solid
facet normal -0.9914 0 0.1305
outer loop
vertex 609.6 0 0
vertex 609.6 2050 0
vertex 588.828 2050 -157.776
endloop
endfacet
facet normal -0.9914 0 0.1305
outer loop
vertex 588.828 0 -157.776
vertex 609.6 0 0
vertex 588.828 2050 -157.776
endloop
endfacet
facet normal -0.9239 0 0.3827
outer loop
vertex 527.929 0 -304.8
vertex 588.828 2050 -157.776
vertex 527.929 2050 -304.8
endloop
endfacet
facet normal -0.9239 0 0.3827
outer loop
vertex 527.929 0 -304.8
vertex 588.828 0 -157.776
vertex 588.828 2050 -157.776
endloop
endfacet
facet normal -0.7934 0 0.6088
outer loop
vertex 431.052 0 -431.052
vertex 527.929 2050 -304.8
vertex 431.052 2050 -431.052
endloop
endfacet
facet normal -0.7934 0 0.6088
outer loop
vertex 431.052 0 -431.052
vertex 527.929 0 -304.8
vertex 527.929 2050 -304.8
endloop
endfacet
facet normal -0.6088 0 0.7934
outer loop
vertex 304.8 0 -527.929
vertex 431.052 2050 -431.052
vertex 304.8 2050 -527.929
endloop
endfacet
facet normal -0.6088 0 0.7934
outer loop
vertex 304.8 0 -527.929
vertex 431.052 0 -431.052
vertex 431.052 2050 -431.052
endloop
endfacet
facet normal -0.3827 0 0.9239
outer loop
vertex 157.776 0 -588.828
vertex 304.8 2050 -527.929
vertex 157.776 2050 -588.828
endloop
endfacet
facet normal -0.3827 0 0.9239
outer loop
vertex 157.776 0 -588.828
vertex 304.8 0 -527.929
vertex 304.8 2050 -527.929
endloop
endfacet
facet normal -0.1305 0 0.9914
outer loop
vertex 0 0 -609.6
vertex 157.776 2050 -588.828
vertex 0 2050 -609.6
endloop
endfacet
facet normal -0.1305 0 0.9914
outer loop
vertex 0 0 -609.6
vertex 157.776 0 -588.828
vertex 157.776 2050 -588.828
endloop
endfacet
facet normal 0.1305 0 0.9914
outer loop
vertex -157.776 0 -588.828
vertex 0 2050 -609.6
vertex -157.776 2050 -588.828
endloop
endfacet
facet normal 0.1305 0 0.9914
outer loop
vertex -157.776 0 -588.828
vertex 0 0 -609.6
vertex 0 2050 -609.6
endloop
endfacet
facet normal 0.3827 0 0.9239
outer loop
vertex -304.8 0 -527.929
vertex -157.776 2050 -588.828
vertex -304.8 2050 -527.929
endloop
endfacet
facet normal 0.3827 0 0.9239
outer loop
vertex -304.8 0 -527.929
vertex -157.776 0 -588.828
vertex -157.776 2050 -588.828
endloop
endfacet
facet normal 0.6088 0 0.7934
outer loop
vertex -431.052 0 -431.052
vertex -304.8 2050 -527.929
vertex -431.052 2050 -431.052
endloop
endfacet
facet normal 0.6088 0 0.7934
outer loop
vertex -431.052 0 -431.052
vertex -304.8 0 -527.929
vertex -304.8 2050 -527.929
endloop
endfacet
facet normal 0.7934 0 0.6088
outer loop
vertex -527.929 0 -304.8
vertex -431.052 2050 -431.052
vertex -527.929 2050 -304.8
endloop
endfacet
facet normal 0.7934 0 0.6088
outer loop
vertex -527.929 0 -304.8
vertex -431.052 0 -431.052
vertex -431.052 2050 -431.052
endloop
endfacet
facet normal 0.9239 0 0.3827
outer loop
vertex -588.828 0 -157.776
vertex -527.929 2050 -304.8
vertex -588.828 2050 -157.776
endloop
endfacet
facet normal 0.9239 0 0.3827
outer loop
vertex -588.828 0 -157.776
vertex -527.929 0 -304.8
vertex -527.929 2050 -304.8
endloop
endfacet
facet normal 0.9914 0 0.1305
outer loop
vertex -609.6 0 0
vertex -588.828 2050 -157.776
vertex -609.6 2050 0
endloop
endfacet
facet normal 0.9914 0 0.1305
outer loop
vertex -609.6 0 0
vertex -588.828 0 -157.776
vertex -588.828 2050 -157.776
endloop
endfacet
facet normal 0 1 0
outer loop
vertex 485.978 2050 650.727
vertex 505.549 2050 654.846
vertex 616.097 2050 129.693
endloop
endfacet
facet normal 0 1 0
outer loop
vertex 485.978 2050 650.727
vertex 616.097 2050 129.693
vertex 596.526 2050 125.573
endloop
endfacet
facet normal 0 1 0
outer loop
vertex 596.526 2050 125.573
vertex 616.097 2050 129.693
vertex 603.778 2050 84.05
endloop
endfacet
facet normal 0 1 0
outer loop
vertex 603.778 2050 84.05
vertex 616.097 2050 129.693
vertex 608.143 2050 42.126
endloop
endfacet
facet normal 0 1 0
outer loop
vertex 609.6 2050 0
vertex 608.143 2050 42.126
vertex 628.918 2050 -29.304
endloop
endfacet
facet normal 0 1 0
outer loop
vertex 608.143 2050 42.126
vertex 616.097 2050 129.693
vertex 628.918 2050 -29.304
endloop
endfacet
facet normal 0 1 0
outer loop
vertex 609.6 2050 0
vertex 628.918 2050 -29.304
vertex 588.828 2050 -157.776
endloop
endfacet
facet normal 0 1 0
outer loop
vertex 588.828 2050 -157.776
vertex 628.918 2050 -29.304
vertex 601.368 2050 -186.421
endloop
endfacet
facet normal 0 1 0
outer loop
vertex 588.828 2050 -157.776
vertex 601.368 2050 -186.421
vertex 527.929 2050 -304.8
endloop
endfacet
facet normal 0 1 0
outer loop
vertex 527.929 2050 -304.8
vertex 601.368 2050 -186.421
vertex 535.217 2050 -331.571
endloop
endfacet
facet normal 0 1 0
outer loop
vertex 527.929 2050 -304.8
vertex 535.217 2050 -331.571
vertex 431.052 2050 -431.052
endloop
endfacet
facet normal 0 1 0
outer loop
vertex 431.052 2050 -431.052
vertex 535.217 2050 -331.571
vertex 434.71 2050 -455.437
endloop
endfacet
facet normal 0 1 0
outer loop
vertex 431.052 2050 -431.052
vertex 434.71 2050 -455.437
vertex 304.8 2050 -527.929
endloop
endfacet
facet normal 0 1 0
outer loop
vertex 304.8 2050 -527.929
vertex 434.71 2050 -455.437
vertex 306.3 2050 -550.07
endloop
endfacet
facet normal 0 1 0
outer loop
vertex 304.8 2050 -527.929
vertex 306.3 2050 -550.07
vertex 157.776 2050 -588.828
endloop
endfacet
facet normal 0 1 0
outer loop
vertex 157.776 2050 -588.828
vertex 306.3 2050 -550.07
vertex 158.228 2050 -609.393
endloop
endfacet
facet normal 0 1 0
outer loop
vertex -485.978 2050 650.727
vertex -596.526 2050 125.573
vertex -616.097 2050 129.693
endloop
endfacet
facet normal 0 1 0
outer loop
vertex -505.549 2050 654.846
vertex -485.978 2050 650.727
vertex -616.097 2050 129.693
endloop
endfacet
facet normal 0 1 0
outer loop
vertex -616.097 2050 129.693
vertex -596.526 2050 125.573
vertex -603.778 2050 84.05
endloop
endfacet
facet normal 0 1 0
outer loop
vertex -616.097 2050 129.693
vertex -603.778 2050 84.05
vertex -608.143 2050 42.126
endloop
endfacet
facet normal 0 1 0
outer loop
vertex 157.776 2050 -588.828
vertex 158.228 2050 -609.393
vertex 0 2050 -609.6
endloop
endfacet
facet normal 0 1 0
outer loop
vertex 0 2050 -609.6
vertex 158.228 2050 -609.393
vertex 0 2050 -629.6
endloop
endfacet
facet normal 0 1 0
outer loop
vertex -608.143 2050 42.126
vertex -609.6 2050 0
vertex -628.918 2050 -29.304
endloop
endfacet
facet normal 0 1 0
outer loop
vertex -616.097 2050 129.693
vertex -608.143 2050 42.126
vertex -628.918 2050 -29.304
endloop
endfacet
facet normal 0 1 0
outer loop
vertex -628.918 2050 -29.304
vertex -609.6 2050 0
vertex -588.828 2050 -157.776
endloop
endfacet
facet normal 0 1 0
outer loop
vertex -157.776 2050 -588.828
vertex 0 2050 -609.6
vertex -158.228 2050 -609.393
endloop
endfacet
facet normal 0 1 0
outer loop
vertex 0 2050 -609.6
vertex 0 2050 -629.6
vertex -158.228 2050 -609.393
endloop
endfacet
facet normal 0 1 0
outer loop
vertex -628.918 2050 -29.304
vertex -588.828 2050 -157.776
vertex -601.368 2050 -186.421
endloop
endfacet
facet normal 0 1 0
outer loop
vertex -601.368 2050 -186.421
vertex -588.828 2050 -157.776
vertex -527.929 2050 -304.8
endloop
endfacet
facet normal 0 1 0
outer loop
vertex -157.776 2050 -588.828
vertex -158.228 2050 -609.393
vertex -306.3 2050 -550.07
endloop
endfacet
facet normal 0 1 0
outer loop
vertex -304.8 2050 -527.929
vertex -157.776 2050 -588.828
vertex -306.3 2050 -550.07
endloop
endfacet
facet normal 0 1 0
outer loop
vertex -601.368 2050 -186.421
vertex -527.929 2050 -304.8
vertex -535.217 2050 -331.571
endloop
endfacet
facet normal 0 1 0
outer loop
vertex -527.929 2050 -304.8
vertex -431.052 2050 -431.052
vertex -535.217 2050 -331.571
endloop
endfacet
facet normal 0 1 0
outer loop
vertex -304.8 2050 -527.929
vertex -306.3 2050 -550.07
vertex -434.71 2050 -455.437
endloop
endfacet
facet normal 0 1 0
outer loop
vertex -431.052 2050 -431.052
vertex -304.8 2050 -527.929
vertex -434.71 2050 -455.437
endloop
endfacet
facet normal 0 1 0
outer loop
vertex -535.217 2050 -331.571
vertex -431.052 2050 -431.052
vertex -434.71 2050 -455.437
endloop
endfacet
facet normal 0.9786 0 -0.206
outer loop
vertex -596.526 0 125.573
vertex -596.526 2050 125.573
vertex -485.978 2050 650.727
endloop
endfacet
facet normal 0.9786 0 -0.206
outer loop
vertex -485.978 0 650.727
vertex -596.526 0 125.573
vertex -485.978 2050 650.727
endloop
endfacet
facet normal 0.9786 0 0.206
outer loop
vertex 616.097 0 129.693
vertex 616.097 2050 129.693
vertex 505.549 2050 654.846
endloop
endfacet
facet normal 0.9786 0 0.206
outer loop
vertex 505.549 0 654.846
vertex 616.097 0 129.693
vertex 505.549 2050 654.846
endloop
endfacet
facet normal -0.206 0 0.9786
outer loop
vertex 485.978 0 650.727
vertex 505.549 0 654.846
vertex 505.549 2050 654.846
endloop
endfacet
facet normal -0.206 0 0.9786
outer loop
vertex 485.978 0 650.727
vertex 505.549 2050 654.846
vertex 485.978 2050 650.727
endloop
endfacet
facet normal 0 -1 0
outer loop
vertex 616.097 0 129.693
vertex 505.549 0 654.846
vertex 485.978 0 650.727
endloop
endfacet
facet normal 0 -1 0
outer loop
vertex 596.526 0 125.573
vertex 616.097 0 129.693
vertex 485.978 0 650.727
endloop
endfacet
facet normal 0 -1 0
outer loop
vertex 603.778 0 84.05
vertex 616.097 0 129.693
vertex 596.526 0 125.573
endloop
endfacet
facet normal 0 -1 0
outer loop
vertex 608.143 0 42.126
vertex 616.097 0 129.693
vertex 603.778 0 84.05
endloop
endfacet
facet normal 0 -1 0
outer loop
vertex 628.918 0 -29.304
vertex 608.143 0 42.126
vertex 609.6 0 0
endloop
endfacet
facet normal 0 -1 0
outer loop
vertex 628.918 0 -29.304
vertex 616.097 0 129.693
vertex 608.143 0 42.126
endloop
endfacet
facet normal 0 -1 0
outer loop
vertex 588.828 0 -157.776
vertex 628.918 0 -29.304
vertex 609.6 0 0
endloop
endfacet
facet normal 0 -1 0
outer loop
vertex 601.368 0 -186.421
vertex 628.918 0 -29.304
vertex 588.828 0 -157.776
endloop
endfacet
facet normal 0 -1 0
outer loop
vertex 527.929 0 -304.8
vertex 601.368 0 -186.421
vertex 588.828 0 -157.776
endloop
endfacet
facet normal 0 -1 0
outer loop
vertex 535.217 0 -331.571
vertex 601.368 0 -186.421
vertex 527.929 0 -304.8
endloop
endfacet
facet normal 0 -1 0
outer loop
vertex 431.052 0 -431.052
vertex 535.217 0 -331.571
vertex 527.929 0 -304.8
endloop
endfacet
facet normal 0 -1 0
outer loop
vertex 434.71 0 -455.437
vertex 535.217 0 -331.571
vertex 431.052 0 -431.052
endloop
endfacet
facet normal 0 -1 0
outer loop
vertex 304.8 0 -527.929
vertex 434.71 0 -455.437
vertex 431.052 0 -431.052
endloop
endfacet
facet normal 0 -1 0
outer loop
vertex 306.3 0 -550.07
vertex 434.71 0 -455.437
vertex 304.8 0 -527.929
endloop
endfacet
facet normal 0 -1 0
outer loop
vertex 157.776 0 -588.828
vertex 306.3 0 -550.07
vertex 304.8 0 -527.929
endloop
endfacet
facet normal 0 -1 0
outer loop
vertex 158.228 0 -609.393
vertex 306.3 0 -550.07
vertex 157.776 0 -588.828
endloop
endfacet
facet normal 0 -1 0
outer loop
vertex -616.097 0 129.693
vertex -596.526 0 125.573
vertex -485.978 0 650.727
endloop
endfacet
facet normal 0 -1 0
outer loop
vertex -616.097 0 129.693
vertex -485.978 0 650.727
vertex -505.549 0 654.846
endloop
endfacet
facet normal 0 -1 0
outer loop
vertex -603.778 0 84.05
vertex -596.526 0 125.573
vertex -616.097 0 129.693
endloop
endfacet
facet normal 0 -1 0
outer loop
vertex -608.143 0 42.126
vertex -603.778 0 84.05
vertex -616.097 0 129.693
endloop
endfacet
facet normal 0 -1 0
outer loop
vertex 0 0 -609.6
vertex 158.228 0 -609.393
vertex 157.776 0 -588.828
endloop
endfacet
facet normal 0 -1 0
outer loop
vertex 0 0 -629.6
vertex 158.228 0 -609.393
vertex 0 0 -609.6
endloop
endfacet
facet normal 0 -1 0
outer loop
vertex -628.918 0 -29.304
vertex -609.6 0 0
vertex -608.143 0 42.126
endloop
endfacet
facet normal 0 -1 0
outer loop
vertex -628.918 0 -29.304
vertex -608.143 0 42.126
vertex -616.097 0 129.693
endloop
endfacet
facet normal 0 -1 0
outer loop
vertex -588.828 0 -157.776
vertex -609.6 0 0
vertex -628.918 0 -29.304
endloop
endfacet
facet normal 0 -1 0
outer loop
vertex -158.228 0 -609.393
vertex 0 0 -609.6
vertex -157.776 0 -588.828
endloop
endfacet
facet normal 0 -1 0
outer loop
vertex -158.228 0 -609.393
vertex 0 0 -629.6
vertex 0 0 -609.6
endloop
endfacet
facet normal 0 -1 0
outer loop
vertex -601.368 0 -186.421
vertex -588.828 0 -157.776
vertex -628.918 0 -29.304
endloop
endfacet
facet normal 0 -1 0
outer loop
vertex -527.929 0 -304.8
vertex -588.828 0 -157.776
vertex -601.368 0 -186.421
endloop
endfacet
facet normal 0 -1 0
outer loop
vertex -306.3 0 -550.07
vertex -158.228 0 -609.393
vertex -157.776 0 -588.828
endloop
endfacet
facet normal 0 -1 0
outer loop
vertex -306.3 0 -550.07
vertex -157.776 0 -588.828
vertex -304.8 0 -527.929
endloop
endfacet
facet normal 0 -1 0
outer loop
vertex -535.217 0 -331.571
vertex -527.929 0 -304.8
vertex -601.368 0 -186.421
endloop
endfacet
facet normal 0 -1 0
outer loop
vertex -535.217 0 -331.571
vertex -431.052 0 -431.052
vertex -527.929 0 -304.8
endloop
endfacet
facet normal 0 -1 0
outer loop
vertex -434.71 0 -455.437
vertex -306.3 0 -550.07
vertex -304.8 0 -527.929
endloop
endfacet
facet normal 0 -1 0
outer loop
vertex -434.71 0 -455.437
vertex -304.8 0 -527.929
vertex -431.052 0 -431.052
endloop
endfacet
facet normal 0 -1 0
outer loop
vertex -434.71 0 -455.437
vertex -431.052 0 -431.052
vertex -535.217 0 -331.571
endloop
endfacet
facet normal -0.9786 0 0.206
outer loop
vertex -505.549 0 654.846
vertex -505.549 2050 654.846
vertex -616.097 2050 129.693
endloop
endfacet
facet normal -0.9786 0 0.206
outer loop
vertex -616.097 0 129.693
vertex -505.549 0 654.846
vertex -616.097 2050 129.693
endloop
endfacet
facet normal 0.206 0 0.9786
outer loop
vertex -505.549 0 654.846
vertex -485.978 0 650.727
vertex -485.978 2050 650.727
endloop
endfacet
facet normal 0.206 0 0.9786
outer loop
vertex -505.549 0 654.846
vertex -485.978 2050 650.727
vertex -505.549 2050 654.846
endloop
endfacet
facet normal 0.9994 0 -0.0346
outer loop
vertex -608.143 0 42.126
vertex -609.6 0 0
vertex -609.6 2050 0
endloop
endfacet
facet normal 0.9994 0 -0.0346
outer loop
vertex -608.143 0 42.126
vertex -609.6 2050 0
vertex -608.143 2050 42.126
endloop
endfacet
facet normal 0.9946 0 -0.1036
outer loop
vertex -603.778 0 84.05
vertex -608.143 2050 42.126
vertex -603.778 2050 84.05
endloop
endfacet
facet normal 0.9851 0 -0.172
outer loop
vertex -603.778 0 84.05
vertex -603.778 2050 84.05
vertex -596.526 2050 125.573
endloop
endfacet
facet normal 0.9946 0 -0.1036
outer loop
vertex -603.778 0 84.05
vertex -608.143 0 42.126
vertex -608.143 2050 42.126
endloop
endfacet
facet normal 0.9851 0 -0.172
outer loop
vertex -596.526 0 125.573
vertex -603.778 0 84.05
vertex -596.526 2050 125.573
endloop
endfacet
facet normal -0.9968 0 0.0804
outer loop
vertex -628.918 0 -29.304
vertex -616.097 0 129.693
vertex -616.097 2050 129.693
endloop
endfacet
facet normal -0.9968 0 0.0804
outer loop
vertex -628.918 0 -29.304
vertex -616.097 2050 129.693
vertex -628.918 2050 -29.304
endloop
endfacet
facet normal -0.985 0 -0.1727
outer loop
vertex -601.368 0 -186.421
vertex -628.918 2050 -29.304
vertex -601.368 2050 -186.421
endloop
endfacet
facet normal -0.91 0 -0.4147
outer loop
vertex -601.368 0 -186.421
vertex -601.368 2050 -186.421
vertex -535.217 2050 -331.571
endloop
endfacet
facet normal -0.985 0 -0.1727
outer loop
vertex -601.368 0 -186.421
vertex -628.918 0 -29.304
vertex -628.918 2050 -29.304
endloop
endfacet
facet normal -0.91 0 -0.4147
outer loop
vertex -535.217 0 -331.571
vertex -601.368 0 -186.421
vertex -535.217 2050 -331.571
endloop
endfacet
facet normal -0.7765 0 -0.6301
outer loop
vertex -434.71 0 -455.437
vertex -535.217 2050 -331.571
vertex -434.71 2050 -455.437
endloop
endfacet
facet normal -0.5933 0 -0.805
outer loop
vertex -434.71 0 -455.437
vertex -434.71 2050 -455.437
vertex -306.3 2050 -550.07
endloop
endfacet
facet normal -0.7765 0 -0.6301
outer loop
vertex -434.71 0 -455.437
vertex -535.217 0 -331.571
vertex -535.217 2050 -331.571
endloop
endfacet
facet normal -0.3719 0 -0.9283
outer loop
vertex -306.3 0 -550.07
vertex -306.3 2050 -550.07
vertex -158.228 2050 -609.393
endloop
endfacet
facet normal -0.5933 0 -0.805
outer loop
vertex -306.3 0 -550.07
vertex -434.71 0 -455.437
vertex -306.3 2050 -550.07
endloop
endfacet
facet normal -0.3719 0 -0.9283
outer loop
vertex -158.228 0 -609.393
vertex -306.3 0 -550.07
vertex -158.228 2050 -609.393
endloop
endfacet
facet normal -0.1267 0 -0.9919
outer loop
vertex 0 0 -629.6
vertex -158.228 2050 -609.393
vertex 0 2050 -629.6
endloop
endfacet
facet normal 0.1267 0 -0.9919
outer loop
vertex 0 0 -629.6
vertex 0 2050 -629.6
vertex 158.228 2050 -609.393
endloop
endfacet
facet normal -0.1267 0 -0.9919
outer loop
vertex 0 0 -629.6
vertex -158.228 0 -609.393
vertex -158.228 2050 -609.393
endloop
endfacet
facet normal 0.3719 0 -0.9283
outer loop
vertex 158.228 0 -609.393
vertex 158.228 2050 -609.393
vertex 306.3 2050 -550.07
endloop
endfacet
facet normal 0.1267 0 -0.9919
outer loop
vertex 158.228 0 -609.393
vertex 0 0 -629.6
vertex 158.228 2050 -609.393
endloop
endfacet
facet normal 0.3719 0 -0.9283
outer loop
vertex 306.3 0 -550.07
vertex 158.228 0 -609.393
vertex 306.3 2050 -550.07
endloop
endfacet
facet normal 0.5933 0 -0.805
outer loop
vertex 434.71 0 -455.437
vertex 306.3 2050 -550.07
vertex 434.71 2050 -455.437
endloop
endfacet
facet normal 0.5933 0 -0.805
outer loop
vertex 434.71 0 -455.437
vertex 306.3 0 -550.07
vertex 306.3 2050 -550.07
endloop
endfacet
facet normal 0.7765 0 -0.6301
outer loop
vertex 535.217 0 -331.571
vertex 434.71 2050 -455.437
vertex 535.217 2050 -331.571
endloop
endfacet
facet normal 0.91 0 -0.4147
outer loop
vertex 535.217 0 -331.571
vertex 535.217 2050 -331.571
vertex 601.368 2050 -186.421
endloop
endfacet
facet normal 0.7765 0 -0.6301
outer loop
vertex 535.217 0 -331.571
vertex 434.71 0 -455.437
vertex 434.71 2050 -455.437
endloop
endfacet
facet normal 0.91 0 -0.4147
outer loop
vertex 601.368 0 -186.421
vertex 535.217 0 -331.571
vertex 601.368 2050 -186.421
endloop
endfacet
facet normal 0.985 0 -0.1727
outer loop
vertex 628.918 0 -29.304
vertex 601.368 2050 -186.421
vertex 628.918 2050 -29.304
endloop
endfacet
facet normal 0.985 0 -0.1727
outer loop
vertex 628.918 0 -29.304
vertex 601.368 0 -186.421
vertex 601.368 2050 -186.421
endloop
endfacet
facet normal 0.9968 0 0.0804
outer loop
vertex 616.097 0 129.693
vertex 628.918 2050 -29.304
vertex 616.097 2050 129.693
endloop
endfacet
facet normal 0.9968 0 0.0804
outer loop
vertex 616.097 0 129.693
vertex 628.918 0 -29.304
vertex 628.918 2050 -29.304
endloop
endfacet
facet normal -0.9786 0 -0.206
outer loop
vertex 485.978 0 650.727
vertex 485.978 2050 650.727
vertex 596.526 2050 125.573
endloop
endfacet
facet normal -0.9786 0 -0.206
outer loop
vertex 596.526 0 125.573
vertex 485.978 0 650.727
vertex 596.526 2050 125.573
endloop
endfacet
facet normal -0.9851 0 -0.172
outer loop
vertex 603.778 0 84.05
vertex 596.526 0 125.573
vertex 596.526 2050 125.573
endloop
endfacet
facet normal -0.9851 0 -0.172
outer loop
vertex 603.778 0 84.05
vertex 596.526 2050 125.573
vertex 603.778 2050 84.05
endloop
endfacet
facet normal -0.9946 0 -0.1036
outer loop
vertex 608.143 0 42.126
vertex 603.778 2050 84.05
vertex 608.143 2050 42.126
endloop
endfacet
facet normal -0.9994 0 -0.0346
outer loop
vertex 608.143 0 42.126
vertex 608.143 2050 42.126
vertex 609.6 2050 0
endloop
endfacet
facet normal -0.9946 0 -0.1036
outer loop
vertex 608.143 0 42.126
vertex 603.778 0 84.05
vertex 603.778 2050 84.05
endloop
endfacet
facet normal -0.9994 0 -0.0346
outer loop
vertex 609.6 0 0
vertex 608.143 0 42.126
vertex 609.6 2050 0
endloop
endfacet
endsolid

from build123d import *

# Parameters (mm, degrees)
ELECTRONICS_GLASS_EXTRUDE_DEPTH = 2050


with BuildPart() as part:
    # Electronics Glass Sketch → Electronics Glass Extrude (new body)
    with BuildSketch(Plane(origin=(0, 0, 0), x_dir=(1, 0, 0), z_dir=(0, 1, 0))):
        with BuildLine():
            Line((616.097304934, -129.692986908), (505.548652467, -654.846493454))
            Line((505.548652467, -654.846493454), (485.977581789, -650.726639994))
            Line((485.977581789, -650.726639994), (596.526234256, -125.573133448))
            ThreePointArc((596.526234256, -125.573133448), (606.322749203, -63.125936022), (609.6, 0))
            ThreePointArc((609.6, 0), (0, 609.6), (-609.6, 0))
            ThreePointArc((-609.6, 0), (-606.322749203, -63.125936022), (-596.526234256, -125.573133448))
            Line((-596.526234256, -125.573133448), (-485.977581789, -650.726639994))
            Line((-485.977581789, -650.726639994), (-505.548652467, -654.846493454))
            Line((-505.548652467, -654.846493454), (-616.097304934, -129.692986908))
            ThreePointArc((-616.097304934, -129.692986908), (0, 629.6), (616.097304934, -129.692986908))
        make_face()
    extrude(amount=ELECTRONICS_GLASS_EXTRUDE_DEPTH)


solid = part.part
